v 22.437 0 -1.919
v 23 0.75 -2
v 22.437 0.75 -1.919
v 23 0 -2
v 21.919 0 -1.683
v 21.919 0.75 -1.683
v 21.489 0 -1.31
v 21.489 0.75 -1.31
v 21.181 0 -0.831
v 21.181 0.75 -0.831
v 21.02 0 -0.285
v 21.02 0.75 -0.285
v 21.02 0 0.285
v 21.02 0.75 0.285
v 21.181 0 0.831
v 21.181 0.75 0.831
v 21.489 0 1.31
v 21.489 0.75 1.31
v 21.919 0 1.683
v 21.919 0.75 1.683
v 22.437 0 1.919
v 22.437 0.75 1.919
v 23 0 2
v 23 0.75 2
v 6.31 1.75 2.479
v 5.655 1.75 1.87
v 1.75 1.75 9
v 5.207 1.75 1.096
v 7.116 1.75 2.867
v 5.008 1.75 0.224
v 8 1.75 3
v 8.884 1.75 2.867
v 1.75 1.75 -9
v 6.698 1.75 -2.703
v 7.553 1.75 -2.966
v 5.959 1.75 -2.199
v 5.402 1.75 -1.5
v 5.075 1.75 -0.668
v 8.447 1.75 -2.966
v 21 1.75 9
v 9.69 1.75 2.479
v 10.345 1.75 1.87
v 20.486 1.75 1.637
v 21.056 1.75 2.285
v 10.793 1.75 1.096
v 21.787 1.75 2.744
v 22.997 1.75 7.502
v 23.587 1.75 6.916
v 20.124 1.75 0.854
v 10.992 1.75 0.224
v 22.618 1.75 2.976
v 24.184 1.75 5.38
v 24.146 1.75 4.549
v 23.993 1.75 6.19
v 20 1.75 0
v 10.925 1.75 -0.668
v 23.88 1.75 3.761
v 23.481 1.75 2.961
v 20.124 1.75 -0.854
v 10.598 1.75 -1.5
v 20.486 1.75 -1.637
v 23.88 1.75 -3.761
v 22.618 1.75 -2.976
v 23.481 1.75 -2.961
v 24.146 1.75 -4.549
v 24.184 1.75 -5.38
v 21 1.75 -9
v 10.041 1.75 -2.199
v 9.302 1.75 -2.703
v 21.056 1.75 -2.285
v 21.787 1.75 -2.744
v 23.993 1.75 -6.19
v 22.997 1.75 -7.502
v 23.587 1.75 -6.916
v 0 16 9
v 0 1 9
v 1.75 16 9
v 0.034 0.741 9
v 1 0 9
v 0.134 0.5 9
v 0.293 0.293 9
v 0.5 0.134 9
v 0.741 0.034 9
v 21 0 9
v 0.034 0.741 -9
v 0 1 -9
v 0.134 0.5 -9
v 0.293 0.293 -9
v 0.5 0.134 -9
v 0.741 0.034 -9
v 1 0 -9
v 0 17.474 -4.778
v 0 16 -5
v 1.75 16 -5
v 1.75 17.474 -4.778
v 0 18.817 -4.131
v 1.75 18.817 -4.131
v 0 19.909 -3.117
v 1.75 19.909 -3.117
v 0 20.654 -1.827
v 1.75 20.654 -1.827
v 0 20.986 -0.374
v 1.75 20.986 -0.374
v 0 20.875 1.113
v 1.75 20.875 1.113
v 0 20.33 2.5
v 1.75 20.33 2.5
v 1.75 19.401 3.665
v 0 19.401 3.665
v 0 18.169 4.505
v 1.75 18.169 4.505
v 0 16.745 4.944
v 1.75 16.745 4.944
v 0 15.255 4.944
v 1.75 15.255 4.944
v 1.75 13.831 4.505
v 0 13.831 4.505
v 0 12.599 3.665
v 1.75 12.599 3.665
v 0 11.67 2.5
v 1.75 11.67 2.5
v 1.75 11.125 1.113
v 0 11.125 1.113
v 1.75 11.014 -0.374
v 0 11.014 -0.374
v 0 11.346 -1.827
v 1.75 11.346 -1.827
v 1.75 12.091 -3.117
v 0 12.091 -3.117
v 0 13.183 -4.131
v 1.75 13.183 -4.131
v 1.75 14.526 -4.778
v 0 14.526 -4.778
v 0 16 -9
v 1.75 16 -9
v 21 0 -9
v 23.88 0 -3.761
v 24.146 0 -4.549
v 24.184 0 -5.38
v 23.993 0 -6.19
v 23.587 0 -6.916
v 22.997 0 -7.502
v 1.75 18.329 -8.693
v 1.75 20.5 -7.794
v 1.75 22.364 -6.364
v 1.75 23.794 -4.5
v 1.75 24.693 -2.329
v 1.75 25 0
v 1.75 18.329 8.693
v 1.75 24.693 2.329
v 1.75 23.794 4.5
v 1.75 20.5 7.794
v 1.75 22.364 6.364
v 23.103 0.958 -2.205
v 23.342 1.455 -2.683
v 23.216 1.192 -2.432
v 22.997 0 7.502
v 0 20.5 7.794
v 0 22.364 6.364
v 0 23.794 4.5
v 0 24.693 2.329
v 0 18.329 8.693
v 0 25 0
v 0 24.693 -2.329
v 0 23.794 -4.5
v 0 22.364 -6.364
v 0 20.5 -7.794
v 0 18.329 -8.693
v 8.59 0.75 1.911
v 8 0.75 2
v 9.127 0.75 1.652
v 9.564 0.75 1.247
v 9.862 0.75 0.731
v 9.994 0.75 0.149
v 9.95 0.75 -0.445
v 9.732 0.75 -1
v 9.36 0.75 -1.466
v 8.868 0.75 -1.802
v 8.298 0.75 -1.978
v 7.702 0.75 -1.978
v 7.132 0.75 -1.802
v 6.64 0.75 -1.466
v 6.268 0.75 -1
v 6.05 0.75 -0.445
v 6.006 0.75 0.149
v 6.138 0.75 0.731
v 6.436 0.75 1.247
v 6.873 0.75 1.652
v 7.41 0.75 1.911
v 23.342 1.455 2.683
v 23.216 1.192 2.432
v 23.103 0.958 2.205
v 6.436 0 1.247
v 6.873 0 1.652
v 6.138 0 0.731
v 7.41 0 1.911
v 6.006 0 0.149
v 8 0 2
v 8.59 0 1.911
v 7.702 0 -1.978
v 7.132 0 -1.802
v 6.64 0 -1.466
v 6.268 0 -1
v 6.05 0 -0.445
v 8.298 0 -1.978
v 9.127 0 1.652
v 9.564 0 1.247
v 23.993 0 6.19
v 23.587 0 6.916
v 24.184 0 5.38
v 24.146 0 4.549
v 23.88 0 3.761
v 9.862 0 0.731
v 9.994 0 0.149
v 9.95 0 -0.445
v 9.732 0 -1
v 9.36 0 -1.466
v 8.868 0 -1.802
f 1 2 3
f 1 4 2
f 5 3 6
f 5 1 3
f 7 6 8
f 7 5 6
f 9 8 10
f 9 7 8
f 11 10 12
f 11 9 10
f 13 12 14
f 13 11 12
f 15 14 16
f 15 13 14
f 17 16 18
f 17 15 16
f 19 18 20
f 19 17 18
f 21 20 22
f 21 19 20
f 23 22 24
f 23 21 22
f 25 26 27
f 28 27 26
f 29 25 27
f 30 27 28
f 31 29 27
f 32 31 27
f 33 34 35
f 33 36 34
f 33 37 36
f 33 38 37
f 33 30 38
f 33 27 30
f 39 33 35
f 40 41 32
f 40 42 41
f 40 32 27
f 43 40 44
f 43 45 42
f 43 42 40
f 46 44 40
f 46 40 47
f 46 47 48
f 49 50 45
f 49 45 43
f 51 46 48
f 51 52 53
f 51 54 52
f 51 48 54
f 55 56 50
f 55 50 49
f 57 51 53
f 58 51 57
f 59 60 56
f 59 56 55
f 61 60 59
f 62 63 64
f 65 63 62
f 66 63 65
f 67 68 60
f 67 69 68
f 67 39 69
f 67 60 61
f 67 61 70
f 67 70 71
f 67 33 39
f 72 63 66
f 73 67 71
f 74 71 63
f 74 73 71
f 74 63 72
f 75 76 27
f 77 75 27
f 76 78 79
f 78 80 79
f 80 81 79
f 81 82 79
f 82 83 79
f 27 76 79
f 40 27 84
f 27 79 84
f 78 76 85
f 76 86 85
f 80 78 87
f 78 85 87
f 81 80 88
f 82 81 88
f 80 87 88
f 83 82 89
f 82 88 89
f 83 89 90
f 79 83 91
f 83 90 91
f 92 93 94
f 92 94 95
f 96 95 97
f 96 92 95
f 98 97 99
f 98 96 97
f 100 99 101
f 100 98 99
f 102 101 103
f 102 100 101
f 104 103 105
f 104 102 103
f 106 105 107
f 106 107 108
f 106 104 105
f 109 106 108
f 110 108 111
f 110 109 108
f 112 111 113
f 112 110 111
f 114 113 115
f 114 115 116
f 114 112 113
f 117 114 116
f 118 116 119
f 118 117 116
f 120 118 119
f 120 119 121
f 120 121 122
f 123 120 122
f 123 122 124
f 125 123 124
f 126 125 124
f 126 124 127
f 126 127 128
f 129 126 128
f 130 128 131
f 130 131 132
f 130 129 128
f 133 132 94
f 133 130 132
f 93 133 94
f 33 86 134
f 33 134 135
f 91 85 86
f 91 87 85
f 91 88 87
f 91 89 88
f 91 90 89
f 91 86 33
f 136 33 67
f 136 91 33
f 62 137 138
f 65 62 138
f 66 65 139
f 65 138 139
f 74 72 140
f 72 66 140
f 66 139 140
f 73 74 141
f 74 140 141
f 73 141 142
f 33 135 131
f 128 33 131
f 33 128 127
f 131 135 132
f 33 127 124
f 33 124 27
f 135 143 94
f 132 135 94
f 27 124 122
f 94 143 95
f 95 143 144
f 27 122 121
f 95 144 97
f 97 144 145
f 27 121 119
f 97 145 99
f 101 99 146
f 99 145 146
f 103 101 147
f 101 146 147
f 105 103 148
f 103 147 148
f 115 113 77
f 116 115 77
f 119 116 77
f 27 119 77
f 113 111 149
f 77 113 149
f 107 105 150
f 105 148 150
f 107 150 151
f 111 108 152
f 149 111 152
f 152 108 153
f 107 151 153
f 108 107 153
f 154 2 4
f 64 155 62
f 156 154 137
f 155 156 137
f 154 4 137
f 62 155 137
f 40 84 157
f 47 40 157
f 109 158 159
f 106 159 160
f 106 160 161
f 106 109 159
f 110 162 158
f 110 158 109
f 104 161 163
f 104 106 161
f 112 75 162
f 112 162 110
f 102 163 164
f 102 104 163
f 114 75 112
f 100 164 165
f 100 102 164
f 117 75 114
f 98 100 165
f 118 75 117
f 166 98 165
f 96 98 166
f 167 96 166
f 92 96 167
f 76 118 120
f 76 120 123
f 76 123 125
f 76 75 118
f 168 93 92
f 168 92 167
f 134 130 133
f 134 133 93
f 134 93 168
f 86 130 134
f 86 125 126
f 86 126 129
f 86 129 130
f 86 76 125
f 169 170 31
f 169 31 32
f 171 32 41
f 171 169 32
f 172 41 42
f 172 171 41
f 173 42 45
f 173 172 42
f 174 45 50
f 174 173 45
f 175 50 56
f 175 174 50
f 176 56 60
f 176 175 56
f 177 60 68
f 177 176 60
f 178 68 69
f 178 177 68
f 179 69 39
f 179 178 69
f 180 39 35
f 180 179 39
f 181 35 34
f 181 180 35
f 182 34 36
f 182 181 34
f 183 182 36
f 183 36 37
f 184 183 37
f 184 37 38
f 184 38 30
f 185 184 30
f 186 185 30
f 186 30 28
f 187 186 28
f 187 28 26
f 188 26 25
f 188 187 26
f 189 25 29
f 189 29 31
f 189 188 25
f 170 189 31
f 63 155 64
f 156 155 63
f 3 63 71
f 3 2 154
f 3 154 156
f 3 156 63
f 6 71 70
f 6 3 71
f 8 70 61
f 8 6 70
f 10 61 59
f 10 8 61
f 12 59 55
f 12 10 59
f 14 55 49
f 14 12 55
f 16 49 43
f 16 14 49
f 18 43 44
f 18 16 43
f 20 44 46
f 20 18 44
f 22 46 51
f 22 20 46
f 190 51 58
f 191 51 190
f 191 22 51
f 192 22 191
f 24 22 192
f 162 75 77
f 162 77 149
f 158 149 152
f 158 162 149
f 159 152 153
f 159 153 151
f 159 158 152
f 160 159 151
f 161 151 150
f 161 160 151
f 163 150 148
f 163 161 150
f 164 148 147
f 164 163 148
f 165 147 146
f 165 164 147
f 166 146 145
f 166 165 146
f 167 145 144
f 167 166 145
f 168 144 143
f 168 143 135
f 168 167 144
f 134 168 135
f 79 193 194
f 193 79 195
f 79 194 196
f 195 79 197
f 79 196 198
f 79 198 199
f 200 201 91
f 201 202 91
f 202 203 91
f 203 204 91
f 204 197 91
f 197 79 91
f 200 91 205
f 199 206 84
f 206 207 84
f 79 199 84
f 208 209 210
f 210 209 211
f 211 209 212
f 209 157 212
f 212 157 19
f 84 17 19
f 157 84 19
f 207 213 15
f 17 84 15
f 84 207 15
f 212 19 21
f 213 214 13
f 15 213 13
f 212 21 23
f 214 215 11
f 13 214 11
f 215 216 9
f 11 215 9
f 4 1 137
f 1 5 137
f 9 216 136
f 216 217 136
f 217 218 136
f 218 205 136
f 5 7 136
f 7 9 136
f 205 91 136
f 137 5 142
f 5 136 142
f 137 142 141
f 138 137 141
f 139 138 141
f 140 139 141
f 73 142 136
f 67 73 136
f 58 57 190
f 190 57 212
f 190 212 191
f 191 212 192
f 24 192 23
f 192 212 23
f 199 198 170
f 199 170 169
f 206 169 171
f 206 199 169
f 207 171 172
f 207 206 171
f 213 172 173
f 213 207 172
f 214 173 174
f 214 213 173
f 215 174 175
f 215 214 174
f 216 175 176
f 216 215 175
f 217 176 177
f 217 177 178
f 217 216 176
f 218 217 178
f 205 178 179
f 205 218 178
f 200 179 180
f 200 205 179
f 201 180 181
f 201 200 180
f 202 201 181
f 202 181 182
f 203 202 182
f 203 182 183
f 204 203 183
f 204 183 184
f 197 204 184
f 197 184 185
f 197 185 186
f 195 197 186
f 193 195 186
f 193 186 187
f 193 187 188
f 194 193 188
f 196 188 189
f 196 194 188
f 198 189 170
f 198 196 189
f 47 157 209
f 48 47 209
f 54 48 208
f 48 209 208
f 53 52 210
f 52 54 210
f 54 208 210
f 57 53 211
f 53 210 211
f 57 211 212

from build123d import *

# Parameters (mm, degrees)
SKETCH_1_W          = 28
SKETCH_1_H          = 18
SKETCH_1_R          = 2
EXTRUDE_1_DEPTH     = 1.75
SKETCH_2_R          = 5
EXTRUDE_2_DEPTH     = 1.75
FILLET_1_R          = 1
CHAMFER_1_SIZE      = 1
CUT_EXTRUDE_1_REACH = 40.601


with BuildPart() as part:
    # Эскиз1 → Бобышка-Вытянуть1 (new body)
    with BuildSketch(Plane(origin=(0, 0, 0), x_dir=(1, 0, 0), z_dir=(0, 1, 0))):
        with Locations((14, 0)):
            Rectangle(SKETCH_1_W, SKETCH_1_H)
        with Locations(Location((8, 0, 0), (0, 0, 270))):
            Circle(SKETCH_1_R, mode=Mode.SUBTRACT)
        with Locations(Location((23, 0, 0), (0, 0, 270))):
            Circle(SKETCH_1_R, mode=Mode.SUBTRACT)
    extrude(amount=EXTRUDE_1_DEPTH)

    # Эскиз2 → Бобышка-Вытянуть2 (add)
    with BuildSketch(Plane(origin=(0, 0, 0), x_dir=(0, 0, -1), z_dir=(1, 0, 0))):
        with BuildLine():
            Line((-9, 0), (-9, 16))
            ThreePointArc((-9, 16), (0, 25), (9, 16))
            Line((9, 16), (9, 0))
            Line((9, 0), (-9, 0))
        make_face()
        with Locations((0, 16)):
            Circle(SKETCH_2_R, mode=Mode.SUBTRACT)
    extrude(amount=EXTRUDE_2_DEPTH)

    # Скругление1
    fillet_1_edges = [part.edges().sort_by_distance(p)[0] for p in [
        (0, 0, 0),
    ]]
    fillet(fillet_1_edges, radius=FILLET_1_R)

    # Фаска1
    chamfer_1_edges = [part.edges().sort_by_distance(p)[0] for p in [
        (8, 1.75, -2),
        (23, 1.75, -2),
    ]]
    chamfer(chamfer_1_edges, length=CHAMFER_1_SIZE)

    # Эскиз3 → Вырез-Вытянуть1 (cut, up to next)
    with BuildSketch(Plane(origin=(0, 0, 0), x_dir=(-1, 0, 0), z_dir=(0, -1, 0)), mode=Mode.PRIVATE) as cut_extrude_1_sk1:
        with BuildLine():
            ThreePointArc((-25, 0), (-24.414213562, 1.414213562), (-23, 2))
            Line((-23, 2), (-23.880298325, 3.76059665))
            ThreePointArc((-23.880298325, 3.76059665), (-24.11676372, 5.791496198), (-22.997016752, 7.502237436))
            Line((-22.997016752, 7.502237436), (-21, 9))
            Line((-21, 9), (-28, 9))
            Line((-28, 9), (-28, 0))
            Line((-28, 0), (-25, 0))
        make_face()
    cut_extrude_1_tool1 = extrude(cut_extrude_1_sk1.sketch, amount=-CUT_EXTRUDE_1_REACH, mode=Mode.PRIVATE) & part.part
    # Эскиз3 → Вырез-Вытянуть1 (cut, up to next)
    with BuildSketch(Plane(origin=(0, 0, 0), x_dir=(-1, 0, 0), z_dir=(0, -1, 0)), mode=Mode.PRIVATE) as cut_extrude_1_sk2:
        with BuildLine():
            ThreePointArc((-23, -2), (-24.414213562, -1.414213562), (-25, 0))
            Line((-25, 0), (-28, 0))
            Line((-28, 0), (-28, -9))
            Line((-28, -9), (-21, -9))
            Line((-21, -9), (-22.997016752, -7.502237436))
            ThreePointArc((-22.997016752, -7.502237436), (-24.11676372, -5.791496198), (-23.880298325, -3.76059665))
            Line((-23.880298325, -3.76059665), (-23, -2))
        make_face()
    cut_extrude_1_tool2 = extrude(cut_extrude_1_sk2.sketch, amount=-CUT_EXTRUDE_1_REACH, mode=Mode.PRIVATE) & part.part
    add(cut_extrude_1_tool1.solids().sort_by_distance((25.731211, 0, -4.895819))[0], mode=Mode.SUBTRACT)
    add(cut_extrude_1_tool2.solids().sort_by_distance((25.731211, 0, 4.895819))[0], mode=Mode.SUBTRACT)


solid = part.part
